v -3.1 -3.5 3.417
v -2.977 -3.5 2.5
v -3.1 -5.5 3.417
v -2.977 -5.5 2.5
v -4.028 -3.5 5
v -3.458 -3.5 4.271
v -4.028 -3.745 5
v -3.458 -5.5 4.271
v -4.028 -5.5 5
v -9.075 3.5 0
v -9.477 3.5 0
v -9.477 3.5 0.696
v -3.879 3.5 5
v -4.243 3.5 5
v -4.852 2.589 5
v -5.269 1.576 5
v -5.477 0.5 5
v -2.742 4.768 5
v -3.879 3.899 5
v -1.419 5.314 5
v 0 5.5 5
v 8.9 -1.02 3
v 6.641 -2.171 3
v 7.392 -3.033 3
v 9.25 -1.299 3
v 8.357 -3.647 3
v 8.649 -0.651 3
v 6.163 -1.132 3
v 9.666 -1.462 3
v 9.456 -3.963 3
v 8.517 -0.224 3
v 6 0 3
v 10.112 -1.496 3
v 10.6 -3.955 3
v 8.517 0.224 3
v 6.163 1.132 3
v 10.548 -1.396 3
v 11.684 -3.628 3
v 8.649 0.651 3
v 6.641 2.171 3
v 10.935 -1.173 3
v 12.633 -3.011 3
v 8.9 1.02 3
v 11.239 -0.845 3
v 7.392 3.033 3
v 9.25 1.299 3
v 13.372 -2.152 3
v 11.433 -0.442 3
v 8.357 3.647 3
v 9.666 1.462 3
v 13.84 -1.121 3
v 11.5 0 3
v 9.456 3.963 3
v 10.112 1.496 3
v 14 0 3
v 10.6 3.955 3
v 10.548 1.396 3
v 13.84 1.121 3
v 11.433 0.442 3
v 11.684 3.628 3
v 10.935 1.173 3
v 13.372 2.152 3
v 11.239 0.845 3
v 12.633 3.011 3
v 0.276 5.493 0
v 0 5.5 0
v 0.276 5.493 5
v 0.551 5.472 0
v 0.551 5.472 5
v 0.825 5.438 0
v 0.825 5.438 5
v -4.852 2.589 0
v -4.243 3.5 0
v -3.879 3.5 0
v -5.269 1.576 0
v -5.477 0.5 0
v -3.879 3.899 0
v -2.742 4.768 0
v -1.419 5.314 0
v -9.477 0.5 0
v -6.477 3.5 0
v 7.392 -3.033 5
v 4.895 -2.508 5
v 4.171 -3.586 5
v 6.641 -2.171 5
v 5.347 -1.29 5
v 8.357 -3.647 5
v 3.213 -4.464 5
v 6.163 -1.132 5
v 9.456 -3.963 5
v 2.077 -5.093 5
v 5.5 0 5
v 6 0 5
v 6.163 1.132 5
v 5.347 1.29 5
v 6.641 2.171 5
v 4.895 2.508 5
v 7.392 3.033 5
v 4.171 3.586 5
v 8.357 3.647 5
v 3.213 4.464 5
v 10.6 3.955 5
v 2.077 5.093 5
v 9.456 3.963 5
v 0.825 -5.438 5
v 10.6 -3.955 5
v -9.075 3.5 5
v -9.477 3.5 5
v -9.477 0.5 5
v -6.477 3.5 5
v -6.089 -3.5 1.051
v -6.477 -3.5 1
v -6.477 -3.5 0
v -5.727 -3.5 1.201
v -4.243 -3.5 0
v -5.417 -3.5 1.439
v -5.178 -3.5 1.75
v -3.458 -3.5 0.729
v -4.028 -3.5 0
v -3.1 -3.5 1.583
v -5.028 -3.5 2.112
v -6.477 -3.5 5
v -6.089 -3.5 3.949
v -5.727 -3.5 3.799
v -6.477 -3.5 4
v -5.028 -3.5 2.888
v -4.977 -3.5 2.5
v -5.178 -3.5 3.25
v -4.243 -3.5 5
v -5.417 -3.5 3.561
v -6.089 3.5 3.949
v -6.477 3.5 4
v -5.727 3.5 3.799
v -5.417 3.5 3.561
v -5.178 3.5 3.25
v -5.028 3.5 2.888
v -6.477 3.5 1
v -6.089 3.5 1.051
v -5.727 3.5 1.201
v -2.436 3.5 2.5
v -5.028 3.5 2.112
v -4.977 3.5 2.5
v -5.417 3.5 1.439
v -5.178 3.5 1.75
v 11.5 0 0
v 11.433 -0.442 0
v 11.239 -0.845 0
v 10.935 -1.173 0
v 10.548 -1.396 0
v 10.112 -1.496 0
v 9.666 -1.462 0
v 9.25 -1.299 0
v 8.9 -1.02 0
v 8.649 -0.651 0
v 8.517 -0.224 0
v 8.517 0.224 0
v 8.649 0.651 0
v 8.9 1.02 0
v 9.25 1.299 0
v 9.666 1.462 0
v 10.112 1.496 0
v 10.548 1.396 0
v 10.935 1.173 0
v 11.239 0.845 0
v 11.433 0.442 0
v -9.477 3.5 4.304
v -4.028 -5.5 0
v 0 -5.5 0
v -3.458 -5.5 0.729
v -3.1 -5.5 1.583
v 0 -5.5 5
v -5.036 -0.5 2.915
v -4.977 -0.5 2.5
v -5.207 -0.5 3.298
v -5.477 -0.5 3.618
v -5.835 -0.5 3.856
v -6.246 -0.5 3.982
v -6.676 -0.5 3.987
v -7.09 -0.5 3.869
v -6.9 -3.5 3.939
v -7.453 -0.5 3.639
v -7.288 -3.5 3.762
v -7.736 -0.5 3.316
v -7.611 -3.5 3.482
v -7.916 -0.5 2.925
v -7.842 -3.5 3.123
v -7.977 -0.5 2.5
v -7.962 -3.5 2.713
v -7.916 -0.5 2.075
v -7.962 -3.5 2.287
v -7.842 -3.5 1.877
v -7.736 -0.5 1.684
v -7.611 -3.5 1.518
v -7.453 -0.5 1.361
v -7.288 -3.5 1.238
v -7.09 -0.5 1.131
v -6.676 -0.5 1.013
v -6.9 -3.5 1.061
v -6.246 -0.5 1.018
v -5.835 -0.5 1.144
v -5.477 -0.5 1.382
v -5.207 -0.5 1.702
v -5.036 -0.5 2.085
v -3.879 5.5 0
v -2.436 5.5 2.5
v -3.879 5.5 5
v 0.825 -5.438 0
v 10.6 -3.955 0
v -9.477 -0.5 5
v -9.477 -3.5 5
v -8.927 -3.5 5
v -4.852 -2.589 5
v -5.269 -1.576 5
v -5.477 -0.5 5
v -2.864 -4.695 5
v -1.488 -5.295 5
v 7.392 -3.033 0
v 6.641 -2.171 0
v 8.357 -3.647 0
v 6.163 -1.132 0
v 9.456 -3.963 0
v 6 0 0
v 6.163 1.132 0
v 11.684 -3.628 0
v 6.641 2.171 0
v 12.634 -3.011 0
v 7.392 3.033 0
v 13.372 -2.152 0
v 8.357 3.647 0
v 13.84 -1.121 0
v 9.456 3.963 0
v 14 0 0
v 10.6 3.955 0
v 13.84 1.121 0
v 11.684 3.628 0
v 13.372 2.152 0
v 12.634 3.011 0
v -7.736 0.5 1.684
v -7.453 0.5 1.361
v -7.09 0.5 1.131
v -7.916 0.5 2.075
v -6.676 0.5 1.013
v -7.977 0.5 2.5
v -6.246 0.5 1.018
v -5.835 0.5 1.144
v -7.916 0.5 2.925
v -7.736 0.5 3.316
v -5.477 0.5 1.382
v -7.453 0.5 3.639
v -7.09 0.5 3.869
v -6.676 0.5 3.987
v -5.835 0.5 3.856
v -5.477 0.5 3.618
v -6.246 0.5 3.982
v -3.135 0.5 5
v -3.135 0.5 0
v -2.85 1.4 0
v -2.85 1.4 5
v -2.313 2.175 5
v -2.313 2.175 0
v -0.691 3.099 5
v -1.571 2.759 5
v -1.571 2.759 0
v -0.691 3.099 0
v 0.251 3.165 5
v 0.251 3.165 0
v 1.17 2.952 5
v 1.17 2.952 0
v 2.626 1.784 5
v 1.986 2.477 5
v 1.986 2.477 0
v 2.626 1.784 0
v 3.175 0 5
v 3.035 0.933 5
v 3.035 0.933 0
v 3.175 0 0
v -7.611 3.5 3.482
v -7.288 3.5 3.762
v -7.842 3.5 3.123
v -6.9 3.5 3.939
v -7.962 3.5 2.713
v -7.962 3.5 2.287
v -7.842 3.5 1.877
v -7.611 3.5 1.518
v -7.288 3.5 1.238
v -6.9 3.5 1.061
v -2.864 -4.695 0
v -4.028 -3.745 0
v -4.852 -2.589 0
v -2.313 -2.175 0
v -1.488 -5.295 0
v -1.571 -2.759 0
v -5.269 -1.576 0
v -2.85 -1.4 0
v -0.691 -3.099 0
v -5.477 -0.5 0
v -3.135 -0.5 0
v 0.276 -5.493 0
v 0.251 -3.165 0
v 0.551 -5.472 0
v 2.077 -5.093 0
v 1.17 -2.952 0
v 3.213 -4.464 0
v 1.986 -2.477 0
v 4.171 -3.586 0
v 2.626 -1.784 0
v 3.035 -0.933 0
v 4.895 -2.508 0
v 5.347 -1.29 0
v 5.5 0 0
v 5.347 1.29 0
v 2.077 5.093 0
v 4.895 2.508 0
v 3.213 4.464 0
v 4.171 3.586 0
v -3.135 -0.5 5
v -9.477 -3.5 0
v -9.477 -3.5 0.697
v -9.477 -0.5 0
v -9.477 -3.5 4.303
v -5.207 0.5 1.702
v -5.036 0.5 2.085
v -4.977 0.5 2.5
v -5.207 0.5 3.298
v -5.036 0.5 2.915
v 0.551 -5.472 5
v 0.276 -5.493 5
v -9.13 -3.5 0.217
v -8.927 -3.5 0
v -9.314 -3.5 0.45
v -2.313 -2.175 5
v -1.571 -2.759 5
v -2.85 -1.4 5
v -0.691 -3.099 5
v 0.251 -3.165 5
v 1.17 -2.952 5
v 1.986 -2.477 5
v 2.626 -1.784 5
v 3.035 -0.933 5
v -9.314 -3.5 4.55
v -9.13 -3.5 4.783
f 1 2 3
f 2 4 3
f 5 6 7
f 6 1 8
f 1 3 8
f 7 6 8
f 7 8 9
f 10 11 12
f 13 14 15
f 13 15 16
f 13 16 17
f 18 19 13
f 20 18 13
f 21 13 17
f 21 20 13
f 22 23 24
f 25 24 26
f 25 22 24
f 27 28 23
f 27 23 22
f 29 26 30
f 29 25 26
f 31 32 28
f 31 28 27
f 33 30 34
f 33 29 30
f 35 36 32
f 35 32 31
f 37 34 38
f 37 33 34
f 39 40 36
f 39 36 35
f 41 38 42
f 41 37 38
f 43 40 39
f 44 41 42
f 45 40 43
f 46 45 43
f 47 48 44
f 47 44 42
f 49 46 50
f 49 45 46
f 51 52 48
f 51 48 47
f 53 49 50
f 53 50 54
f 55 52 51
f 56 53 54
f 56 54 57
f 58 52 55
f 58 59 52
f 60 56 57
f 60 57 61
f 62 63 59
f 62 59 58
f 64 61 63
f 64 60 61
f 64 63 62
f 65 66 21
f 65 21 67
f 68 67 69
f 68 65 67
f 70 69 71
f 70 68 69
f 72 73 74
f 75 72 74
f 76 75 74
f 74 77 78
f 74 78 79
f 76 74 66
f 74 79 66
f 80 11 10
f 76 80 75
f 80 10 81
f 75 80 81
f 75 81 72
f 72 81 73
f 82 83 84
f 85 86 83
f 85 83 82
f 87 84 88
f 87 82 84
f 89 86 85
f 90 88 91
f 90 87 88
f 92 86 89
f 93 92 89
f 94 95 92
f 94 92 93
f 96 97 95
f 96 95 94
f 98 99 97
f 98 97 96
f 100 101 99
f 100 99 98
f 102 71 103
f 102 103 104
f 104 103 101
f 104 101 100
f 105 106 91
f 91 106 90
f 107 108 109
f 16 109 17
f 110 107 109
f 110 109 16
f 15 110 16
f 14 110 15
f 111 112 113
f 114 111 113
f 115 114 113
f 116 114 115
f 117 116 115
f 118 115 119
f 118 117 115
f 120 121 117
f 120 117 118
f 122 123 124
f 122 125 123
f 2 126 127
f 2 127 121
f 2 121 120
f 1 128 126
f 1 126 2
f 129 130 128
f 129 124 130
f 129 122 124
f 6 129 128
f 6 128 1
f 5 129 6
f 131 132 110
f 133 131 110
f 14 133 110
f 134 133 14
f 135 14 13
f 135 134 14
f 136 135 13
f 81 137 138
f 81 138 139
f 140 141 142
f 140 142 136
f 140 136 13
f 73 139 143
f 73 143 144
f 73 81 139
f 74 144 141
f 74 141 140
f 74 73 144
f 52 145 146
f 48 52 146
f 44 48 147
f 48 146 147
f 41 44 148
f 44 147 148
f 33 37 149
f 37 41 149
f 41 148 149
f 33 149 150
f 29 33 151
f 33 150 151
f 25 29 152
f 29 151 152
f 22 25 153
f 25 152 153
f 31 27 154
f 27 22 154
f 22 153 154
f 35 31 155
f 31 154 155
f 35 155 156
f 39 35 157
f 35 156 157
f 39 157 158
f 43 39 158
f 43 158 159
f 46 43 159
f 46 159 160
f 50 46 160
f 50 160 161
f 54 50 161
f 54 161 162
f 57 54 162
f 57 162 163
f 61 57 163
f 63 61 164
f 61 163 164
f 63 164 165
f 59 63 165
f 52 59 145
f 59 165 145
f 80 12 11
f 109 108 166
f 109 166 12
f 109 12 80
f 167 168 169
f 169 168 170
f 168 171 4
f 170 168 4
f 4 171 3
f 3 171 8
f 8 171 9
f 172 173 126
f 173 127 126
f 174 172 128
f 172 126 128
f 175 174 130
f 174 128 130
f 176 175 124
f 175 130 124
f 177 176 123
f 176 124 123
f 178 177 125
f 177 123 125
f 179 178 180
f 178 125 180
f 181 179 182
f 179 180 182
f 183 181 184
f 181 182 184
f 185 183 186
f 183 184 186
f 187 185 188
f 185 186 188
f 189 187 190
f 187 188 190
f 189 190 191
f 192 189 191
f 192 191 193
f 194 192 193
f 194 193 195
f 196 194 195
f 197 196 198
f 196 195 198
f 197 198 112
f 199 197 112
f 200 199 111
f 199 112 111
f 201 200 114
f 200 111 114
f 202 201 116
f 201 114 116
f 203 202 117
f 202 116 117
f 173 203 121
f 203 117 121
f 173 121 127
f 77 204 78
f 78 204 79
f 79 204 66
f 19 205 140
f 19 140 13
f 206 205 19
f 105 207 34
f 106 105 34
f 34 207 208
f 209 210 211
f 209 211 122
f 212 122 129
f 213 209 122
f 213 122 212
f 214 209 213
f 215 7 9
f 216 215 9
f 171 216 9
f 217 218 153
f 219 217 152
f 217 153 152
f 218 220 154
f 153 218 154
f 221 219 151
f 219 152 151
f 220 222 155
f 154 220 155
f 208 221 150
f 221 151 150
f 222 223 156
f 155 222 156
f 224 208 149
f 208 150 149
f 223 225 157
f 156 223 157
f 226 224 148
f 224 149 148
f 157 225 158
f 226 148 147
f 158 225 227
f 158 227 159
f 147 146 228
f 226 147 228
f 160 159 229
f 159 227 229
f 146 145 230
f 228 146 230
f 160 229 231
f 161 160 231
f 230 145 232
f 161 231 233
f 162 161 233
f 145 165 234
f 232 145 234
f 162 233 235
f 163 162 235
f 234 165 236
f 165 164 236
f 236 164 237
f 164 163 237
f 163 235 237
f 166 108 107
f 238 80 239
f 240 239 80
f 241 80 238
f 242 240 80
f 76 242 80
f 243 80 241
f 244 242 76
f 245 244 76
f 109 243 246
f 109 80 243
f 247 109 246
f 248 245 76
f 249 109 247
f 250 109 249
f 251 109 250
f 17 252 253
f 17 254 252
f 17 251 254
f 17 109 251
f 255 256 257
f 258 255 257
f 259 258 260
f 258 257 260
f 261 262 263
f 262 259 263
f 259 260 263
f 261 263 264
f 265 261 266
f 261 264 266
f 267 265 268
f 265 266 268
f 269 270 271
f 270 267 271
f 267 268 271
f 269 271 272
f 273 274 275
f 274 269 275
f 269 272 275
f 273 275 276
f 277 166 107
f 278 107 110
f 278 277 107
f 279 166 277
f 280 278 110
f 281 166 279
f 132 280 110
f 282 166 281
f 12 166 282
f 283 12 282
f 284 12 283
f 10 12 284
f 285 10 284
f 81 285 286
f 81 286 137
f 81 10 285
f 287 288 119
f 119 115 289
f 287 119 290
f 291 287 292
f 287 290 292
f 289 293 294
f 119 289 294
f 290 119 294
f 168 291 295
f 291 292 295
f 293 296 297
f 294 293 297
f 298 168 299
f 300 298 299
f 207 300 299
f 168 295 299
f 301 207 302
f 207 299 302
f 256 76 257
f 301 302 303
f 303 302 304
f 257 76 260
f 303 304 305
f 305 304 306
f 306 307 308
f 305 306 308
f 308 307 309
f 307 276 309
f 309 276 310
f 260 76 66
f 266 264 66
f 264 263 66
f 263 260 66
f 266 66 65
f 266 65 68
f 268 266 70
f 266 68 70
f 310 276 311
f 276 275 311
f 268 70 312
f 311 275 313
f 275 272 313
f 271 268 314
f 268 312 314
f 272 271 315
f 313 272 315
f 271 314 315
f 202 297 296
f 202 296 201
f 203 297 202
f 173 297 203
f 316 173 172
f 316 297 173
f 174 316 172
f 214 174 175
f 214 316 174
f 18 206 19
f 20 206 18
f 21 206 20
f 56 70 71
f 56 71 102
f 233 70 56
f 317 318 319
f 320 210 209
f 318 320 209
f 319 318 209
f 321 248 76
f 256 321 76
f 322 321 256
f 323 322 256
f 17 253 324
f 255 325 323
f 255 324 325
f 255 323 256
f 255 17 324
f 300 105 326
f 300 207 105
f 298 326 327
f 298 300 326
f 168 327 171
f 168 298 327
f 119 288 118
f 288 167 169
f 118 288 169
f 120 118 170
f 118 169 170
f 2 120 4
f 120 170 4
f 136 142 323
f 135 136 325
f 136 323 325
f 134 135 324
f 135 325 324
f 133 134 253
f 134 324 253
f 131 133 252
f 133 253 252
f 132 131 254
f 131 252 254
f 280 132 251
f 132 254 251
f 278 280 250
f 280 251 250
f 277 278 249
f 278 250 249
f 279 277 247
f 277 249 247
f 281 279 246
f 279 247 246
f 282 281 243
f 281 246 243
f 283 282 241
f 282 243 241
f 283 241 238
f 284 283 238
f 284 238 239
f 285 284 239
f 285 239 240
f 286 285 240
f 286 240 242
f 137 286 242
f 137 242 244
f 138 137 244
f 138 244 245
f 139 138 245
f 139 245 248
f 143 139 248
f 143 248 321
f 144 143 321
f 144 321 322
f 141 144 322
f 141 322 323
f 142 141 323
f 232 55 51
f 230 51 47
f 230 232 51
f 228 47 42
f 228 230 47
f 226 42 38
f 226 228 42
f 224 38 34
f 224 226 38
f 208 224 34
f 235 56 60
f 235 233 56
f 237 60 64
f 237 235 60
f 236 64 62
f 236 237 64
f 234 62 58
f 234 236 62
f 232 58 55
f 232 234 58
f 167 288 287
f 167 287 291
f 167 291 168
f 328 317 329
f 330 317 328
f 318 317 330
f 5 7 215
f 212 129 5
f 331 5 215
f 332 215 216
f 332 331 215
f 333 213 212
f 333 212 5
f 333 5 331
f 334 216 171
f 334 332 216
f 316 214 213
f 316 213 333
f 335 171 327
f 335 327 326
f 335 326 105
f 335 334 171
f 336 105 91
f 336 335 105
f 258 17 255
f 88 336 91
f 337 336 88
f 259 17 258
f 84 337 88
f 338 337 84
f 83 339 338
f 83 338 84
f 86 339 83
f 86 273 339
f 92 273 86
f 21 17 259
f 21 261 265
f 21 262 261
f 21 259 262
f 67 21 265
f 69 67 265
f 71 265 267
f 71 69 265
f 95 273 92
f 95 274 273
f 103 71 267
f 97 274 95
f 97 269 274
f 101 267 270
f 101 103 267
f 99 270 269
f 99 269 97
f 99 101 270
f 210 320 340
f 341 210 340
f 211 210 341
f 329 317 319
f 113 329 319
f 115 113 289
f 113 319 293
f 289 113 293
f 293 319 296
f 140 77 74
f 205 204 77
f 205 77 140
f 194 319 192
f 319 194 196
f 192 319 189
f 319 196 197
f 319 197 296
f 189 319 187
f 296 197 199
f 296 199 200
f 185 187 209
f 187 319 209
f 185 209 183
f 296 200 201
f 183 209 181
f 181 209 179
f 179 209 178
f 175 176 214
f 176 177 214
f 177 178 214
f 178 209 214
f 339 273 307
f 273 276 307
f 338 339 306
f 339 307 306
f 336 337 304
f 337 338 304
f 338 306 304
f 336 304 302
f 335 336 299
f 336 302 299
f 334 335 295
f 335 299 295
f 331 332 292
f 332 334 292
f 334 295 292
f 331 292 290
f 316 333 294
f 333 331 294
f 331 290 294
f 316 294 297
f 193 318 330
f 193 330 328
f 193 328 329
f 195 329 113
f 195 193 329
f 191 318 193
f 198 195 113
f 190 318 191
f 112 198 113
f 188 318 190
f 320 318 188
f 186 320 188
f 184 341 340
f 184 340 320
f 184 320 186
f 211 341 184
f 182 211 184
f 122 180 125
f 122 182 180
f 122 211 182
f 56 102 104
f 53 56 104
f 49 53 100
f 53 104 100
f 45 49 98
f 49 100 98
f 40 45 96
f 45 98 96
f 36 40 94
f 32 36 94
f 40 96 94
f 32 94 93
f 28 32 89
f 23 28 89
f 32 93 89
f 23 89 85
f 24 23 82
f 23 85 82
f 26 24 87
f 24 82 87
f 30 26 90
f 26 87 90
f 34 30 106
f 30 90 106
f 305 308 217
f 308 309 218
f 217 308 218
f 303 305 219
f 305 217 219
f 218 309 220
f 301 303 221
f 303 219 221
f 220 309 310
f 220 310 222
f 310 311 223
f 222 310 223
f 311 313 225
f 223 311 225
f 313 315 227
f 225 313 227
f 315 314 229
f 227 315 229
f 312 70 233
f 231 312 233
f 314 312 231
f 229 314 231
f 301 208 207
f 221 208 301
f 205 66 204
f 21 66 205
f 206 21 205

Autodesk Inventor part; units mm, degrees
ref_plane "YZ Plane" through (0, 0, 0) normal (1, 0, 0) x (0, 1, 0)
ref_plane "XZ Plane" through (0, 0, 0) normal (0, 1, 0) x (-1, 0, 0)
ref_plane "XY Plane" through (0, 0, 0) normal (0, 0, 1) x (1, 0, 0)
sketch "Sketch1" plane through (0, 0, 0) normal (0, 0, 1) x (1, 0, 0)
  circle A0 centre (0, 0) radius 3.175
  circle A1 centre (0, 0) radius 5.5
  circle A2 centre (10, 0) radius 4
  line L0 (0.825, 5.4378) -> (10.6, 3.9547)
  line L1 (0.825, -5.4378) -> (10.6, -3.9547)
  circle A3 centre (10, 0) radius 1.5
  dimension "d0" = 6.35
  dimension "d1" = 11
  dimension "d2" = 8
  dimension "d3" = 10
  dimension "d4" = 3
extrude "Extrusion1" add sketch "Sketch1" along normal blind 5
sketch "Sketch2" plane through (0, 0, 5) normal (0, 0, 1) x (1, 0, 0)
  arc A0 (0.825, 5.4378) -> (0.825, -5.4378) centre (0, 0) ccw projected
  line L0 (0, -5.5) -> (-9.4772, -5.5)
  line L1 (-9.4772, -5.5) -> (-9.4772, -0.5)
  line L2 (-9.4772, -0.5) -> (-5.4772, -0.5)
  line L3 (-5.4772, -0.5) -> (0, -5.5)
  line L4 (0, 5.5) -> (-9.4772, 5.5)
  line L5 (-9.4772, 5.5) -> (-9.4772, 0.5)
  line L6 (-9.4772, 0.5) -> (-5.4772, 0.5)
  line L7 (-5.4772, 0.5) -> (0, 5.5)
  line L8 (-7.4772, -0.5) -> (-7.4772, 0.5) construction
  point P0 (-7.4772, 0)
  dimension "d7" = 1
  dimension "d8" = 4
extrude "Extrusion2" add sketch "Sketch2" against normal blind 5 contours L7 A0 | A0 L6 L5 L4 | A0 L0 L1 L2
sketch "Sketch3" plane through (-9.4772, -5.5, 5) normal (0, -1, 0) x (1, 0, 0)
  line L0 (0, 0) -> (4, 0) construction
  line L1 (0, 0) -> (0, -5) construction
  line L2 (4, -5) -> (0, -5) construction
  line L3 (4, 0) -> (4, -5) construction
  line L4 (0, 0) -> (4, 0) construction
  line L5 (2, 0) -> (2, -5) construction
  circle A0 centre (3, -2.5) radius 1.5
  point P0 (9.4772, -5)
  point P1 (2, -2.5)
  dimension "d11" = 3
  dimension "d12" = 1
extrude "Extrusion3" cut sketch "Sketch3" against normal through all
sketch "Sketch4" plane through (0, 0, 5) normal (0, 0, 1) x (1, 0, 0)
  line L0 (-9.4772, 0.5) -> (0, 0.5)
  line L1 (0, 0.5) -> (0, -0.5)
  line L2 (0, -0.5) -> (-9.4772, -0.5)
  line L3 (-9.4772, -0.5) -> (-9.4772, 0.5)
  point P0 (0, 0)
  point P1 (0, 0)
extrude "Extrusion4" cut sketch "Sketch4" against normal through all
sketch "Sketch5" plane through (-9.4772, 5.5, 5) normal (0, 1, 0) x (1, 0, 0)
  circle A0 centre (3, 2.5) radius 1.5 projected
  line L0 (7.0415, 2.5) -> (5.0207, -1)
  line L1 (5.0207, -1) -> (0.9793, -1)
  line L2 (0.9793, -1) -> (-1.0415, 2.5)
  line L3 (-1.0415, 2.5) -> (0.9793, 6)
  line L4 (0.9793, 6) -> (5.0207, 6)
  line L5 (5.0207, 6) -> (7.0415, 2.5)
  point P0 (9.4772, 5)
  dimension "d17" = 7
extrude "Extrusion5" cut sketch "Sketch5" against normal blind 2 contours A0 | L0 L1 L2 L3 L4 L5
sketch "Sketch6" plane through (-9.4772, -5.5, 5) normal (0, -1, 0) x (1, 0, 0)
  circle A0 centre (3, -2.5) radius 1.5 projected
  circle A1 centre (3, -2.5) radius 3.5
  point P0 (9.4772, -5)
  dimension "d20" = 7
extrude "Extrusion6" cut sketch "Sketch6" against normal blind 2 contours A0 | A1
sketch "Sketch7" plane through (0, 0, 5) normal (0, 0, 1) x (1, 0, 0)
  circle A0 centre (10, 0) radius 1.5 projected
  arc A1 (10.6, -3.9547) -> (10.6, 3.9547) centre (10, 0) ccw projected
  circle A2 centre (10, 0) radius 4
  point P0 (0, 0)
extrude "Extrusion7" cut sketch "Sketch7" against normal blind 2
sketch "Sketch8" plane through (-9.4772, -3.5, 5) normal (0, -1, 0) x (1, 0, 0)
  line L0 (5.4495, -5) -> (0.5505, -5) projected
  line L1 (0, 0) -> (0, -5) projected
  line L2 (3, -5) -> (0, -5)
  line L3 (0, -5) -> (0, 0)
  line L4 (0, 0) -> (3, 0)
  line L5 (3, 0) -> (3, -5)
  point P0 (9.4772, -5)
extrude "Extrusion8" cut sketch "Sketch8" along normal through all
sketch "Sketch9" plane through (-9.4772, 3.5, 5) normal (0, 1, 0) x (1, 0, 0)
  circle A0 centre (3, 2.5) radius 1.5 projected
  line L0 (5.5981, 0) -> (0.4019, 0) projected
  line L1 (0, 0) -> (0, 5) projected
  line L2 (3, 0) -> (0, 0)
  line L3 (0, 0) -> (0, 5)
  line L4 (0, 5) -> (3, 5)
  line L5 (3, 5) -> (3, 0)
  point P0 (9.4772, 5)
extrude "Extrusion9" cut sketch "Sketch9" along normal through all contours L5 A0 | A0 L5 L0 L2 L1 L4 picked at (2.8803, 2.0145)
properties part number "TA08" material "ABS Plastic"
